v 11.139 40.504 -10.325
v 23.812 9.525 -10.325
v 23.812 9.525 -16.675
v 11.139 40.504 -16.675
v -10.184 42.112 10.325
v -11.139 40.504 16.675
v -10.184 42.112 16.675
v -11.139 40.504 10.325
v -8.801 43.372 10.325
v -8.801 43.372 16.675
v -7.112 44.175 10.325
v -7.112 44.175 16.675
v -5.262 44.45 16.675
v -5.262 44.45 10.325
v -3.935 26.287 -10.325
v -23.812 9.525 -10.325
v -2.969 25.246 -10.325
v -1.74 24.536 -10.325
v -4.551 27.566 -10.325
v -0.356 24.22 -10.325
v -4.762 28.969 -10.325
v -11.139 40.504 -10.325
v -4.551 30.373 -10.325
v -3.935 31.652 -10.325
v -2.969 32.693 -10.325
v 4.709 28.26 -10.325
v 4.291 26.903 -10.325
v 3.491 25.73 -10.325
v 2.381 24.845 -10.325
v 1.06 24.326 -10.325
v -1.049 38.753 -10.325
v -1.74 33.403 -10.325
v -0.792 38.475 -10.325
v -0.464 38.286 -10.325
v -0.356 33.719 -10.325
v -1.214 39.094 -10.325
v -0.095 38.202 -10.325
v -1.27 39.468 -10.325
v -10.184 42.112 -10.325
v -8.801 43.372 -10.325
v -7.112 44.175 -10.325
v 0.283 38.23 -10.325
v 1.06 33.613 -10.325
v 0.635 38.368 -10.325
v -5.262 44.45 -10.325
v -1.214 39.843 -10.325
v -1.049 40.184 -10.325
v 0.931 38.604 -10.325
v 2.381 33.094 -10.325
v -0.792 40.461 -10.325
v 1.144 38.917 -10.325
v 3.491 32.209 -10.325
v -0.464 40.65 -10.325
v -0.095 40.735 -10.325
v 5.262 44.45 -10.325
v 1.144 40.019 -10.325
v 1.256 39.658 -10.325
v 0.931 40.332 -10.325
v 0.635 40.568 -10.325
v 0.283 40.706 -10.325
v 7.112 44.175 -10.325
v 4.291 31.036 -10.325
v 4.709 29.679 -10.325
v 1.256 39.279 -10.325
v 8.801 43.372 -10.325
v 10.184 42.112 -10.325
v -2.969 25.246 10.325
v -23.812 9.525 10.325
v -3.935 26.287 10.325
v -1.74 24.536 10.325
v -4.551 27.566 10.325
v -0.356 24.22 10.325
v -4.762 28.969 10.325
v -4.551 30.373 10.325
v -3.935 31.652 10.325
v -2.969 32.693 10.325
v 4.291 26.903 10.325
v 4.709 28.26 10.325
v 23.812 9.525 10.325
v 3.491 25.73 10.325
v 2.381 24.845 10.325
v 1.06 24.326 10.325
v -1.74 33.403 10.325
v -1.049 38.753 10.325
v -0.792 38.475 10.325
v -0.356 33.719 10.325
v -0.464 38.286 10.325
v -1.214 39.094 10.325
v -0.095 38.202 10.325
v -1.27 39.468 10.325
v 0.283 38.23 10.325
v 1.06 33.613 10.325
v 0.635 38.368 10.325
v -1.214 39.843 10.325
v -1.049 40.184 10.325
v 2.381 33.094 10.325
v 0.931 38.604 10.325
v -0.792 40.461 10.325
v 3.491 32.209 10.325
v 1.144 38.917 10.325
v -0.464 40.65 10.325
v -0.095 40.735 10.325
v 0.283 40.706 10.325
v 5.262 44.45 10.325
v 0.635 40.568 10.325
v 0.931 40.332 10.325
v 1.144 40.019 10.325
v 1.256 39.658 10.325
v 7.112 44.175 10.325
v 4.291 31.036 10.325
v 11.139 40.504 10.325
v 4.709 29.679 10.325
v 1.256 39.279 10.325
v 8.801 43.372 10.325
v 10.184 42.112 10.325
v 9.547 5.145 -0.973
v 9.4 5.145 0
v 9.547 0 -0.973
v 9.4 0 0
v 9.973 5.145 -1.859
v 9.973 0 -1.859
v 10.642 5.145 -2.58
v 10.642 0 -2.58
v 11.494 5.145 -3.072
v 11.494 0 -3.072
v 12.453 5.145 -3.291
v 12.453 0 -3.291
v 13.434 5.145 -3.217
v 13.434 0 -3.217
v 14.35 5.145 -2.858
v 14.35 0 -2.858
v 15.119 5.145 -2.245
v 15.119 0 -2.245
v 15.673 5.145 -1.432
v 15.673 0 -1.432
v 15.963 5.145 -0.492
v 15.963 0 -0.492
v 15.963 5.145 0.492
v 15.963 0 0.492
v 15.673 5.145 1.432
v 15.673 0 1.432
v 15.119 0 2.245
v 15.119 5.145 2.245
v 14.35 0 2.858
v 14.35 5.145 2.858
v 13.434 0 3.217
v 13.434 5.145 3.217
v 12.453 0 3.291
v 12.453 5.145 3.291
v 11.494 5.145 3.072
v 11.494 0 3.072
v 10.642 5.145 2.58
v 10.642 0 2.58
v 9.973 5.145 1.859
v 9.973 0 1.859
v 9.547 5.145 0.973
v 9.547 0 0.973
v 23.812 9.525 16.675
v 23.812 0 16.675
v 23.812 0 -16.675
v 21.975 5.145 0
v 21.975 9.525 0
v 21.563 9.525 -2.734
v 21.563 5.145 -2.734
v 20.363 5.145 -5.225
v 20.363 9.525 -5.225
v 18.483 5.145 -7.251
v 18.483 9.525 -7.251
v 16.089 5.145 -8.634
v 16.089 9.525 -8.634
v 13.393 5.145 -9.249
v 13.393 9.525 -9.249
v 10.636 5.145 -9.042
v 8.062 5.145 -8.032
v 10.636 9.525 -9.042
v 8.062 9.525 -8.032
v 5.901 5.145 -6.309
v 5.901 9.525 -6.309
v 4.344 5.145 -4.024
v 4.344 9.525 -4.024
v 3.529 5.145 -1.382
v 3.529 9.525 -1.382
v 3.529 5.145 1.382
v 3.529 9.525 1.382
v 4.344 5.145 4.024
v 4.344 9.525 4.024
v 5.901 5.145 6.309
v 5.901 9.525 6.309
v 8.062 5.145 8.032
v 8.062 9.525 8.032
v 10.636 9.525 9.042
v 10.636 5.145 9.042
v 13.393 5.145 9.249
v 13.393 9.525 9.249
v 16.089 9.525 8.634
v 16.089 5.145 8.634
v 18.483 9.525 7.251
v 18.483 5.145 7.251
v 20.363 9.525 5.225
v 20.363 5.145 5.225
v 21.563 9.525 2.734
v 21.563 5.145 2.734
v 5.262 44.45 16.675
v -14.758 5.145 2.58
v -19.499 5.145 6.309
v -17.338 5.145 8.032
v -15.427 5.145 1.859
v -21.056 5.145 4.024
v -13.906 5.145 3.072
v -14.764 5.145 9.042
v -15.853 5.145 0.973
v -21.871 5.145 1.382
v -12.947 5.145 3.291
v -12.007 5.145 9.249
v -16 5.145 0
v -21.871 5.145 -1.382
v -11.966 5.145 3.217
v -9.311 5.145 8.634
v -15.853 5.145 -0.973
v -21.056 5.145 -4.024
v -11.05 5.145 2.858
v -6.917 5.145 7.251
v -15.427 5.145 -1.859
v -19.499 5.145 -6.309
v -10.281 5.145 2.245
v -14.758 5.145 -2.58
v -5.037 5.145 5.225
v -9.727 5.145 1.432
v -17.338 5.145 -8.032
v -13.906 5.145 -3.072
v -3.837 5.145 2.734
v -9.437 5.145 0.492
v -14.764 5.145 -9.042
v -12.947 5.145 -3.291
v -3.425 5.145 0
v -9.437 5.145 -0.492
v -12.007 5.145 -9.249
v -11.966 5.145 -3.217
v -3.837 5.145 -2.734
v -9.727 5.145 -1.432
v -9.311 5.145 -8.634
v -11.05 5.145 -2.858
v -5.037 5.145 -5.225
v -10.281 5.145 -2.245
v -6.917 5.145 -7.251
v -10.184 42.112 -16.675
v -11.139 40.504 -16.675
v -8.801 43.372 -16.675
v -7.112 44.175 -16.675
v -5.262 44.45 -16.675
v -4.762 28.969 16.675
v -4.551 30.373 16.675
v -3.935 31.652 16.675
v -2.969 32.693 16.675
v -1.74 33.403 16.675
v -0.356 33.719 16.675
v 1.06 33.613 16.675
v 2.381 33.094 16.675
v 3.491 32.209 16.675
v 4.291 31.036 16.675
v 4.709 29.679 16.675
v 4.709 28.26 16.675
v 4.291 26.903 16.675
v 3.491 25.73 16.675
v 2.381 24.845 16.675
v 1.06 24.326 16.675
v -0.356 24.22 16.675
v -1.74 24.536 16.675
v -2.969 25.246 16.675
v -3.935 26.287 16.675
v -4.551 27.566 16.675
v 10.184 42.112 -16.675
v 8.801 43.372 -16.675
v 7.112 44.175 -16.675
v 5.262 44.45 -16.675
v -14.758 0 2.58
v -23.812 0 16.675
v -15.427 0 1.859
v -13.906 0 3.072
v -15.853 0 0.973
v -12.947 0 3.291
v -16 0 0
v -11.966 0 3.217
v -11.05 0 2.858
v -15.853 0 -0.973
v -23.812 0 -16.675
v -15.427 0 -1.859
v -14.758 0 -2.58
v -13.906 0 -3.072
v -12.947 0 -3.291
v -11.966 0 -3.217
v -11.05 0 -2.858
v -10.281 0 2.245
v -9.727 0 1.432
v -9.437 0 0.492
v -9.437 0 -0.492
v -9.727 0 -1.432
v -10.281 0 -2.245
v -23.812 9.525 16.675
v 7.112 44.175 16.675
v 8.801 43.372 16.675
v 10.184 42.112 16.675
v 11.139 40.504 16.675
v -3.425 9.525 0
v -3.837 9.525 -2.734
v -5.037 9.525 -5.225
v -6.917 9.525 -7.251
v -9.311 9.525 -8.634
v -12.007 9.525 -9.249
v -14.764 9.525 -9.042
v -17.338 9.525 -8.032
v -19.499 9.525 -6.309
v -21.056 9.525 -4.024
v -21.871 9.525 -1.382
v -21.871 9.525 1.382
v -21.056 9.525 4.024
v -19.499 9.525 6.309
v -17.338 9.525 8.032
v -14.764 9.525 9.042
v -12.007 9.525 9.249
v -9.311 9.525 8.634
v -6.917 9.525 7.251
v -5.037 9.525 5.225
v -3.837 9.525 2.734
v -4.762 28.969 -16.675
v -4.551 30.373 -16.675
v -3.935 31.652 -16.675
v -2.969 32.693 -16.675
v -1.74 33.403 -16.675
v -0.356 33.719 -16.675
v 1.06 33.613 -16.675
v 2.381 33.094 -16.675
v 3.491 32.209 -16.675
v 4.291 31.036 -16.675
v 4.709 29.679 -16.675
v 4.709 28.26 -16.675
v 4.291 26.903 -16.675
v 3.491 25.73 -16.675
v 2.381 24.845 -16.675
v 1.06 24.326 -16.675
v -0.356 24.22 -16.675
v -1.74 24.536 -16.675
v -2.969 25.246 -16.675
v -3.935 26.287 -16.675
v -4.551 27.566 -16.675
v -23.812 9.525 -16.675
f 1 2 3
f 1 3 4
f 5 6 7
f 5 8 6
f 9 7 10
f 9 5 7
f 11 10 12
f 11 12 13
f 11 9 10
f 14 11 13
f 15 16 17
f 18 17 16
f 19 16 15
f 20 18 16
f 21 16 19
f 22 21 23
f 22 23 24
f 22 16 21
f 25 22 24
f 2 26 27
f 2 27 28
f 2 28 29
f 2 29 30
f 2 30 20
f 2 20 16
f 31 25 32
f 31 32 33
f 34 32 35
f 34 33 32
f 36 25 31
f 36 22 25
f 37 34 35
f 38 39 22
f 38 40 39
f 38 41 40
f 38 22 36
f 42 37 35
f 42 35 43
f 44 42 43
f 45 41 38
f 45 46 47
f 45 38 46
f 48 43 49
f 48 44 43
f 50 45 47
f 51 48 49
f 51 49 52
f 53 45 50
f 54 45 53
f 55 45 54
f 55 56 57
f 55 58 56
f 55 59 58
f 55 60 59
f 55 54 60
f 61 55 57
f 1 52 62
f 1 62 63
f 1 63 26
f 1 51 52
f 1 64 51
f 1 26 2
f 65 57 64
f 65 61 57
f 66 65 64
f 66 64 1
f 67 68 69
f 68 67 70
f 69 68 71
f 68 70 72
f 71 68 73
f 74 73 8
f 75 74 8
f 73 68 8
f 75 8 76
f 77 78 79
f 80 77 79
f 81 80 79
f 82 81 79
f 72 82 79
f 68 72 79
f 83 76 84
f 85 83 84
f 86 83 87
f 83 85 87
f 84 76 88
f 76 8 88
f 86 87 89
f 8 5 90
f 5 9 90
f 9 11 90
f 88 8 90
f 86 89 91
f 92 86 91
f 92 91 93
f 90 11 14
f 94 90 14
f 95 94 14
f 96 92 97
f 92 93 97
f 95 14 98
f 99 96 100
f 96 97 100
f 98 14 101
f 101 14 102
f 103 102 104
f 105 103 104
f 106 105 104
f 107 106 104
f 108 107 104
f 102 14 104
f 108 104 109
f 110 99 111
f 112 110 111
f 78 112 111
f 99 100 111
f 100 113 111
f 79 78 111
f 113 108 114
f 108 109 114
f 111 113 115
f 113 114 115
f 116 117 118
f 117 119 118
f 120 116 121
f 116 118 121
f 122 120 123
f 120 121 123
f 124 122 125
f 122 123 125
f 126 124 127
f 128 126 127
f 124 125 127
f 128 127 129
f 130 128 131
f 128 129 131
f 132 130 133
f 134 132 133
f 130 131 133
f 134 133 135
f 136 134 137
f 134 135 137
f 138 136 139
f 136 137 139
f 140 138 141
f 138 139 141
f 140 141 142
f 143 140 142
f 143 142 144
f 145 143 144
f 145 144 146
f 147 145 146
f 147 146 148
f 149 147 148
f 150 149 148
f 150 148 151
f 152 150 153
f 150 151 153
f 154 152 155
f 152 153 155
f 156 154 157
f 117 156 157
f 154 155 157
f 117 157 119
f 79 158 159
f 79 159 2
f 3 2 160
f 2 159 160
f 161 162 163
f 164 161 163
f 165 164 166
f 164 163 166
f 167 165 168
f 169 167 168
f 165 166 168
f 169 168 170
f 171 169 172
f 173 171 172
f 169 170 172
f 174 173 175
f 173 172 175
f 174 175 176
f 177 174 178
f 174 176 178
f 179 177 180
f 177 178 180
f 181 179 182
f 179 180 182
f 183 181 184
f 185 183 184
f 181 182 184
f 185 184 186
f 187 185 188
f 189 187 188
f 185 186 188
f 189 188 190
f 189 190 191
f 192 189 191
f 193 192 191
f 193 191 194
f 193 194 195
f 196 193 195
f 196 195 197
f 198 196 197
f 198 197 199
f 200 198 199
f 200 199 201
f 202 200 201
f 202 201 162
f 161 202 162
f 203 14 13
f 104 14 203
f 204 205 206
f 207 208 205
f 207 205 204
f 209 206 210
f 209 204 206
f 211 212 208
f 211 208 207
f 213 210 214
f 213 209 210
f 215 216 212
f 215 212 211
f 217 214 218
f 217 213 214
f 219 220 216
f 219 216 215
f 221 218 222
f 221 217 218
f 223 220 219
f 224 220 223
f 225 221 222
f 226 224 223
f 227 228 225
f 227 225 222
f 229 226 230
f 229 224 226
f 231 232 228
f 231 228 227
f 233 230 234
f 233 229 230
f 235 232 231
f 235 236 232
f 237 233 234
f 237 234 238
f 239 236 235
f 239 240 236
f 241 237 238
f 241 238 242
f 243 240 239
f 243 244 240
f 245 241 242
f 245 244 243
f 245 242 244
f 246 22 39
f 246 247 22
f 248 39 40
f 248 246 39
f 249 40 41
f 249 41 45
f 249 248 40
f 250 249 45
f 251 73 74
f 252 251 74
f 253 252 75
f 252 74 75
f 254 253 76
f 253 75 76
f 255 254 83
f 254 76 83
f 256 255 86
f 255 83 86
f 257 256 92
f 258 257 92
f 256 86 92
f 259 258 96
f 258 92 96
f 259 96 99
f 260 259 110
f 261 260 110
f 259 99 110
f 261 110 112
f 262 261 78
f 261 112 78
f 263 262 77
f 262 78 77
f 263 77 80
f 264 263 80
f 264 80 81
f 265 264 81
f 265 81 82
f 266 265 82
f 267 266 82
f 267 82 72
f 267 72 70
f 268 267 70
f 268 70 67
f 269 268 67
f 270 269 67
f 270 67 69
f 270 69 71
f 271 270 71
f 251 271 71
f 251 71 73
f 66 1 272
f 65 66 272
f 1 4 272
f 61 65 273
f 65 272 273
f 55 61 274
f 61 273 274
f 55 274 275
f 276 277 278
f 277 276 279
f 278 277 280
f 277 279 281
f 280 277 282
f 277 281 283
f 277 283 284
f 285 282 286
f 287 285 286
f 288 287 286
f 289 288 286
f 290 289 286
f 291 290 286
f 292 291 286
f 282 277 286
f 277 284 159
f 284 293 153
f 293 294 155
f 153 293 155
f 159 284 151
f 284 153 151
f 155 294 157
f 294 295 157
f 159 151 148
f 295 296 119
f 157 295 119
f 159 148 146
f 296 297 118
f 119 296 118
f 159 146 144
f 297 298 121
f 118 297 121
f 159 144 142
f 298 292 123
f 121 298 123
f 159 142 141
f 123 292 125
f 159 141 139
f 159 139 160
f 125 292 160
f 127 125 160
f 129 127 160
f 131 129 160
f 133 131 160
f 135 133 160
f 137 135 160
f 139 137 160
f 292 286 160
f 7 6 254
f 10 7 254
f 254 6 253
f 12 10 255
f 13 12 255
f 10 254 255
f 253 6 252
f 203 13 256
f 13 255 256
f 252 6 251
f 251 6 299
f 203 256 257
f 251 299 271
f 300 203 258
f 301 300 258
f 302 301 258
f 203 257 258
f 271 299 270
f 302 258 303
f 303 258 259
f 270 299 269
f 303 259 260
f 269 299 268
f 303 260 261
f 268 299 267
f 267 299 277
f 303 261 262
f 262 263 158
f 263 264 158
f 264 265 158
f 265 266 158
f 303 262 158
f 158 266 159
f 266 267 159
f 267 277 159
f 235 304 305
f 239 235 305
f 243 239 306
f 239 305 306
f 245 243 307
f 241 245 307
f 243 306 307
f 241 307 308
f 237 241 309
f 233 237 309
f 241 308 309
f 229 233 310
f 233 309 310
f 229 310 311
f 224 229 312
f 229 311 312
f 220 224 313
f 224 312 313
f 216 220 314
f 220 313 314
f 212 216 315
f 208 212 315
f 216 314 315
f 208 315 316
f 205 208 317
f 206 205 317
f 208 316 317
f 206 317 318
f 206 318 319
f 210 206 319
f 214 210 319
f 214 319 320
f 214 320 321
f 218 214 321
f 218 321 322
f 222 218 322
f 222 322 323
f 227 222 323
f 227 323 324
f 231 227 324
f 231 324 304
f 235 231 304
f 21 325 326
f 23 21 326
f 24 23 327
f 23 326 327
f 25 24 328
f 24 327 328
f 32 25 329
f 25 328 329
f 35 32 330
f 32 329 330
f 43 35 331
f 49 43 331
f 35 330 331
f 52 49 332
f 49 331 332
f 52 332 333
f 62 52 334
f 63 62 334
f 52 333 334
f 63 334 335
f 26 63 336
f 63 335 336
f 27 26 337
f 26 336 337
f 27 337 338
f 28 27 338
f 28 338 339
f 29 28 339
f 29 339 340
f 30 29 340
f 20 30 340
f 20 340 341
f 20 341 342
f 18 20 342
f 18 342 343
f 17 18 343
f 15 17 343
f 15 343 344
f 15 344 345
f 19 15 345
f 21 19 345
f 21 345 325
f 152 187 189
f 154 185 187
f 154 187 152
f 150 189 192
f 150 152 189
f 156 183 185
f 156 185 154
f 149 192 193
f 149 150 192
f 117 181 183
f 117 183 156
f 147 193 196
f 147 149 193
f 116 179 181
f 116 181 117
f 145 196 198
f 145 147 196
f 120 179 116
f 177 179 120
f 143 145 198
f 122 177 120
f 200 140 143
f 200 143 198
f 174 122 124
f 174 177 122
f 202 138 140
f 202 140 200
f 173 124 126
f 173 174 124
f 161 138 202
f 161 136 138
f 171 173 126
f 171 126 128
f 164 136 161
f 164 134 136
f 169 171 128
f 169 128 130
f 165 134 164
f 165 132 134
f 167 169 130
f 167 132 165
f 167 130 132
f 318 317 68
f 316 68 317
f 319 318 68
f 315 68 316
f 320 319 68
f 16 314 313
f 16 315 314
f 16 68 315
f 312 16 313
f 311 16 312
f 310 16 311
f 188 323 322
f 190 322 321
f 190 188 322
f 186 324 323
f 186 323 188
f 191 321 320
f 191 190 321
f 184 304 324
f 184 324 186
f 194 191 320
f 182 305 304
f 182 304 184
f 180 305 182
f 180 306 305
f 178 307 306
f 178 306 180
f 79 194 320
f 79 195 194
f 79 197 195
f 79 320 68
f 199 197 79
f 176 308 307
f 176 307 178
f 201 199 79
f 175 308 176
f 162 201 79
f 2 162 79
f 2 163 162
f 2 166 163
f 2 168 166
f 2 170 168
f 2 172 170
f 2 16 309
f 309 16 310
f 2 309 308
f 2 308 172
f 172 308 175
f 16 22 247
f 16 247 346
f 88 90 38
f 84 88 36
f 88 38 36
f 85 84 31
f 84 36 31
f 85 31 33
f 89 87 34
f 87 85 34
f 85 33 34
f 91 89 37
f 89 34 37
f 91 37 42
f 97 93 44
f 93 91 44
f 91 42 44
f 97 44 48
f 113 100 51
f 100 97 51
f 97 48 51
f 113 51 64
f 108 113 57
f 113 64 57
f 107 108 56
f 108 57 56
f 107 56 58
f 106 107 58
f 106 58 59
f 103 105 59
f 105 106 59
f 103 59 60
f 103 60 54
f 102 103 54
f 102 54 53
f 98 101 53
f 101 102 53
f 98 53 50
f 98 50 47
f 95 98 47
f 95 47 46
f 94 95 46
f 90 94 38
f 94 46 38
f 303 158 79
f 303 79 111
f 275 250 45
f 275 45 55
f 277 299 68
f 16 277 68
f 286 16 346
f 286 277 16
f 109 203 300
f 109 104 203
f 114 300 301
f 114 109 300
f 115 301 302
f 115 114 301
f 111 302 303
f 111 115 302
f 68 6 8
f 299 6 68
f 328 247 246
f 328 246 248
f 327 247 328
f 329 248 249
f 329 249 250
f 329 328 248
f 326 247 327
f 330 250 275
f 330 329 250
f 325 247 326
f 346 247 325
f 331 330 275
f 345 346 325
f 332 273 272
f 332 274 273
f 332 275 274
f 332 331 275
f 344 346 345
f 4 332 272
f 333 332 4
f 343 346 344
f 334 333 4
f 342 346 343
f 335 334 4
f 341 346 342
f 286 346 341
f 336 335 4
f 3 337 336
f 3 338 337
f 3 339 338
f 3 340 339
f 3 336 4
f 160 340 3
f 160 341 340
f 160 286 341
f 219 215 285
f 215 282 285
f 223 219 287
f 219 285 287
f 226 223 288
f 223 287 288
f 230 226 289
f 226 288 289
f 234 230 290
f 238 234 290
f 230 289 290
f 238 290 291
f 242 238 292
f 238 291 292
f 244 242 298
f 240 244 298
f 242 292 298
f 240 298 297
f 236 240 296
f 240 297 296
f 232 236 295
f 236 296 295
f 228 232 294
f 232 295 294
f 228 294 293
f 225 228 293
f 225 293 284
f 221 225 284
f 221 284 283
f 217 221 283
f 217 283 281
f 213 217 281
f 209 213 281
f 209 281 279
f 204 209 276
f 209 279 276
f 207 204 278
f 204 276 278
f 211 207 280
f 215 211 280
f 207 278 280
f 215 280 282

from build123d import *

# Parameters (mm, degrees)
SKETCH1_W                               = 47.625
SKETCH1_H                               = 33.3502
BOSS_EXTRUDE1_DEPTH                     = 44.45
SKETCH2_W                               = 47.625
SKETCH2_H                               = 20.6502
CUT_EXTRUDE1_DEPTH                      = 34.925
CUT_EXTRUDE2_DEPTH                      = 61.457203841
CUT_EXTRUDE2_DEPTH_BACK                 = 61.457203841
CBORE_FOR_M6_HEX_HEAD_BOLT1_D           = 6.6
CBORE_FOR_M6_HEX_HEAD_BOLT1_DEPTH       = 14.019159957
CBORE_FOR_M6_HEX_HEAD_BOLT1_CBORE_D     = 18.55
CBORE_FOR_M6_HEX_HEAD_BOLT1_CBORE_DEPTH = 4.38
CBORE_FOR_M6_HEX_HEAD_BOLT1_TIP         = 1.982840043
FILLET3_R                               = 6.35
F_3_8_0_375_DIAMETER_HOLE1_D            = 9.525
BOSS_EXTRUDE2_REACH                     = 59.2
SKETCH15_R                              = 1.27


with BuildPart() as part:
    # Sketch1 → Boss-Extrude1 (new body)
    with BuildSketch(Plane(origin=(0, 0, 0), x_dir=(1, 0, 0), z_dir=(0, 1, 0))):
        Rectangle(SKETCH1_W, SKETCH1_H)
    extrude(amount=BOSS_EXTRUDE1_DEPTH)

    # Sketch2 → Cut-Extrude1 (cut)
    with BuildSketch(Plane(origin=(0, 44.45, 0), x_dir=(1, 0, 0), z_dir=(0, 1, 0))):
        Rectangle(SKETCH2_W, SKETCH2_H)
    extrude(amount=-CUT_EXTRUDE1_DEPTH, mode=Mode.SUBTRACT)

    # Sketch3 → Cut-Extrude2 (cut, two sides: drawn at the far end of the back side and taken through both)
    with BuildSketch(Plane(origin=(0, 0, -16.6751), x_dir=(-1, 0, 0), z_dir=(0, 0, -1)).offset(-CUT_EXTRUDE2_DEPTH_BACK)):
        Polygon((23.8125, 44.45), (9.525, 44.45), (23.8125, 9.525), align=None)
        Polygon((-23.8125, 9.525), (-9.525, 44.45), (-23.8125, 44.45), align=None)
    extrude(amount=CUT_EXTRUDE2_DEPTH + CUT_EXTRUDE2_DEPTH_BACK, mode=Mode.SUBTRACT)

    # CBORE for M6 Hex Head Bolt1
    with Locations(Plane(origin=(0, 9.525, 0), x_dir=(1, 0, 0), z_dir=(0, 1, 0))):
        with Locations((-12.7, 0), (12.7, 0)):
            CounterBoreHole(CBORE_FOR_M6_HEX_HEAD_BOLT1_D / 2, CBORE_FOR_M6_HEX_HEAD_BOLT1_CBORE_D / 2, CBORE_FOR_M6_HEX_HEAD_BOLT1_CBORE_DEPTH, depth=CBORE_FOR_M6_HEX_HEAD_BOLT1_DEPTH)
            with Locations((0, 0, -(CBORE_FOR_M6_HEX_HEAD_BOLT1_DEPTH + CBORE_FOR_M6_HEX_HEAD_BOLT1_TIP / 2))):  # 118° drill point
                Cone(0, CBORE_FOR_M6_HEX_HEAD_BOLT1_D / 2, CBORE_FOR_M6_HEX_HEAD_BOLT1_TIP, mode=Mode.SUBTRACT)

    # Fillet3
    fillet3_edges = [part.edges().sort_by_distance(p)[0] for p in [
        (9.525, 44.45, 13.5001),
        (-9.525, 44.45, 13.5001),
        (9.525, 44.45, -13.5001),
        (-9.525, 44.45, -13.5001),
    ]]
    fillet(fillet3_edges, radius=FILLET3_R)

    # 3/8 (0.375) Diameter Hole1 (through all)
    with Locations(Plane.XY.offset(16.6751)):
        with Locations((0, 28.969467427)):
            Hole(F_3_8_0_375_DIAMETER_HOLE1_D / 2)

    # Sketch15 → Boss-Extrude2 (add, up to next)
    with BuildSketch(Plane.XY.offset(-10.3251), mode=Mode.PRIVATE) as boss_extrude2_sk1:
        with Locations(Location((0, 39.468275157, 0), (0, 0, 180))):
            Circle(SKETCH15_R)
    boss_extrude2_tool1 = extrude(boss_extrude2_sk1.sketch, amount=BOSS_EXTRUDE2_REACH, mode=Mode.PRIVATE) - part.part
    add(boss_extrude2_tool1.solids().sort_by_distance((0, 39.468275, -10.3251))[0])


solid = part.part
